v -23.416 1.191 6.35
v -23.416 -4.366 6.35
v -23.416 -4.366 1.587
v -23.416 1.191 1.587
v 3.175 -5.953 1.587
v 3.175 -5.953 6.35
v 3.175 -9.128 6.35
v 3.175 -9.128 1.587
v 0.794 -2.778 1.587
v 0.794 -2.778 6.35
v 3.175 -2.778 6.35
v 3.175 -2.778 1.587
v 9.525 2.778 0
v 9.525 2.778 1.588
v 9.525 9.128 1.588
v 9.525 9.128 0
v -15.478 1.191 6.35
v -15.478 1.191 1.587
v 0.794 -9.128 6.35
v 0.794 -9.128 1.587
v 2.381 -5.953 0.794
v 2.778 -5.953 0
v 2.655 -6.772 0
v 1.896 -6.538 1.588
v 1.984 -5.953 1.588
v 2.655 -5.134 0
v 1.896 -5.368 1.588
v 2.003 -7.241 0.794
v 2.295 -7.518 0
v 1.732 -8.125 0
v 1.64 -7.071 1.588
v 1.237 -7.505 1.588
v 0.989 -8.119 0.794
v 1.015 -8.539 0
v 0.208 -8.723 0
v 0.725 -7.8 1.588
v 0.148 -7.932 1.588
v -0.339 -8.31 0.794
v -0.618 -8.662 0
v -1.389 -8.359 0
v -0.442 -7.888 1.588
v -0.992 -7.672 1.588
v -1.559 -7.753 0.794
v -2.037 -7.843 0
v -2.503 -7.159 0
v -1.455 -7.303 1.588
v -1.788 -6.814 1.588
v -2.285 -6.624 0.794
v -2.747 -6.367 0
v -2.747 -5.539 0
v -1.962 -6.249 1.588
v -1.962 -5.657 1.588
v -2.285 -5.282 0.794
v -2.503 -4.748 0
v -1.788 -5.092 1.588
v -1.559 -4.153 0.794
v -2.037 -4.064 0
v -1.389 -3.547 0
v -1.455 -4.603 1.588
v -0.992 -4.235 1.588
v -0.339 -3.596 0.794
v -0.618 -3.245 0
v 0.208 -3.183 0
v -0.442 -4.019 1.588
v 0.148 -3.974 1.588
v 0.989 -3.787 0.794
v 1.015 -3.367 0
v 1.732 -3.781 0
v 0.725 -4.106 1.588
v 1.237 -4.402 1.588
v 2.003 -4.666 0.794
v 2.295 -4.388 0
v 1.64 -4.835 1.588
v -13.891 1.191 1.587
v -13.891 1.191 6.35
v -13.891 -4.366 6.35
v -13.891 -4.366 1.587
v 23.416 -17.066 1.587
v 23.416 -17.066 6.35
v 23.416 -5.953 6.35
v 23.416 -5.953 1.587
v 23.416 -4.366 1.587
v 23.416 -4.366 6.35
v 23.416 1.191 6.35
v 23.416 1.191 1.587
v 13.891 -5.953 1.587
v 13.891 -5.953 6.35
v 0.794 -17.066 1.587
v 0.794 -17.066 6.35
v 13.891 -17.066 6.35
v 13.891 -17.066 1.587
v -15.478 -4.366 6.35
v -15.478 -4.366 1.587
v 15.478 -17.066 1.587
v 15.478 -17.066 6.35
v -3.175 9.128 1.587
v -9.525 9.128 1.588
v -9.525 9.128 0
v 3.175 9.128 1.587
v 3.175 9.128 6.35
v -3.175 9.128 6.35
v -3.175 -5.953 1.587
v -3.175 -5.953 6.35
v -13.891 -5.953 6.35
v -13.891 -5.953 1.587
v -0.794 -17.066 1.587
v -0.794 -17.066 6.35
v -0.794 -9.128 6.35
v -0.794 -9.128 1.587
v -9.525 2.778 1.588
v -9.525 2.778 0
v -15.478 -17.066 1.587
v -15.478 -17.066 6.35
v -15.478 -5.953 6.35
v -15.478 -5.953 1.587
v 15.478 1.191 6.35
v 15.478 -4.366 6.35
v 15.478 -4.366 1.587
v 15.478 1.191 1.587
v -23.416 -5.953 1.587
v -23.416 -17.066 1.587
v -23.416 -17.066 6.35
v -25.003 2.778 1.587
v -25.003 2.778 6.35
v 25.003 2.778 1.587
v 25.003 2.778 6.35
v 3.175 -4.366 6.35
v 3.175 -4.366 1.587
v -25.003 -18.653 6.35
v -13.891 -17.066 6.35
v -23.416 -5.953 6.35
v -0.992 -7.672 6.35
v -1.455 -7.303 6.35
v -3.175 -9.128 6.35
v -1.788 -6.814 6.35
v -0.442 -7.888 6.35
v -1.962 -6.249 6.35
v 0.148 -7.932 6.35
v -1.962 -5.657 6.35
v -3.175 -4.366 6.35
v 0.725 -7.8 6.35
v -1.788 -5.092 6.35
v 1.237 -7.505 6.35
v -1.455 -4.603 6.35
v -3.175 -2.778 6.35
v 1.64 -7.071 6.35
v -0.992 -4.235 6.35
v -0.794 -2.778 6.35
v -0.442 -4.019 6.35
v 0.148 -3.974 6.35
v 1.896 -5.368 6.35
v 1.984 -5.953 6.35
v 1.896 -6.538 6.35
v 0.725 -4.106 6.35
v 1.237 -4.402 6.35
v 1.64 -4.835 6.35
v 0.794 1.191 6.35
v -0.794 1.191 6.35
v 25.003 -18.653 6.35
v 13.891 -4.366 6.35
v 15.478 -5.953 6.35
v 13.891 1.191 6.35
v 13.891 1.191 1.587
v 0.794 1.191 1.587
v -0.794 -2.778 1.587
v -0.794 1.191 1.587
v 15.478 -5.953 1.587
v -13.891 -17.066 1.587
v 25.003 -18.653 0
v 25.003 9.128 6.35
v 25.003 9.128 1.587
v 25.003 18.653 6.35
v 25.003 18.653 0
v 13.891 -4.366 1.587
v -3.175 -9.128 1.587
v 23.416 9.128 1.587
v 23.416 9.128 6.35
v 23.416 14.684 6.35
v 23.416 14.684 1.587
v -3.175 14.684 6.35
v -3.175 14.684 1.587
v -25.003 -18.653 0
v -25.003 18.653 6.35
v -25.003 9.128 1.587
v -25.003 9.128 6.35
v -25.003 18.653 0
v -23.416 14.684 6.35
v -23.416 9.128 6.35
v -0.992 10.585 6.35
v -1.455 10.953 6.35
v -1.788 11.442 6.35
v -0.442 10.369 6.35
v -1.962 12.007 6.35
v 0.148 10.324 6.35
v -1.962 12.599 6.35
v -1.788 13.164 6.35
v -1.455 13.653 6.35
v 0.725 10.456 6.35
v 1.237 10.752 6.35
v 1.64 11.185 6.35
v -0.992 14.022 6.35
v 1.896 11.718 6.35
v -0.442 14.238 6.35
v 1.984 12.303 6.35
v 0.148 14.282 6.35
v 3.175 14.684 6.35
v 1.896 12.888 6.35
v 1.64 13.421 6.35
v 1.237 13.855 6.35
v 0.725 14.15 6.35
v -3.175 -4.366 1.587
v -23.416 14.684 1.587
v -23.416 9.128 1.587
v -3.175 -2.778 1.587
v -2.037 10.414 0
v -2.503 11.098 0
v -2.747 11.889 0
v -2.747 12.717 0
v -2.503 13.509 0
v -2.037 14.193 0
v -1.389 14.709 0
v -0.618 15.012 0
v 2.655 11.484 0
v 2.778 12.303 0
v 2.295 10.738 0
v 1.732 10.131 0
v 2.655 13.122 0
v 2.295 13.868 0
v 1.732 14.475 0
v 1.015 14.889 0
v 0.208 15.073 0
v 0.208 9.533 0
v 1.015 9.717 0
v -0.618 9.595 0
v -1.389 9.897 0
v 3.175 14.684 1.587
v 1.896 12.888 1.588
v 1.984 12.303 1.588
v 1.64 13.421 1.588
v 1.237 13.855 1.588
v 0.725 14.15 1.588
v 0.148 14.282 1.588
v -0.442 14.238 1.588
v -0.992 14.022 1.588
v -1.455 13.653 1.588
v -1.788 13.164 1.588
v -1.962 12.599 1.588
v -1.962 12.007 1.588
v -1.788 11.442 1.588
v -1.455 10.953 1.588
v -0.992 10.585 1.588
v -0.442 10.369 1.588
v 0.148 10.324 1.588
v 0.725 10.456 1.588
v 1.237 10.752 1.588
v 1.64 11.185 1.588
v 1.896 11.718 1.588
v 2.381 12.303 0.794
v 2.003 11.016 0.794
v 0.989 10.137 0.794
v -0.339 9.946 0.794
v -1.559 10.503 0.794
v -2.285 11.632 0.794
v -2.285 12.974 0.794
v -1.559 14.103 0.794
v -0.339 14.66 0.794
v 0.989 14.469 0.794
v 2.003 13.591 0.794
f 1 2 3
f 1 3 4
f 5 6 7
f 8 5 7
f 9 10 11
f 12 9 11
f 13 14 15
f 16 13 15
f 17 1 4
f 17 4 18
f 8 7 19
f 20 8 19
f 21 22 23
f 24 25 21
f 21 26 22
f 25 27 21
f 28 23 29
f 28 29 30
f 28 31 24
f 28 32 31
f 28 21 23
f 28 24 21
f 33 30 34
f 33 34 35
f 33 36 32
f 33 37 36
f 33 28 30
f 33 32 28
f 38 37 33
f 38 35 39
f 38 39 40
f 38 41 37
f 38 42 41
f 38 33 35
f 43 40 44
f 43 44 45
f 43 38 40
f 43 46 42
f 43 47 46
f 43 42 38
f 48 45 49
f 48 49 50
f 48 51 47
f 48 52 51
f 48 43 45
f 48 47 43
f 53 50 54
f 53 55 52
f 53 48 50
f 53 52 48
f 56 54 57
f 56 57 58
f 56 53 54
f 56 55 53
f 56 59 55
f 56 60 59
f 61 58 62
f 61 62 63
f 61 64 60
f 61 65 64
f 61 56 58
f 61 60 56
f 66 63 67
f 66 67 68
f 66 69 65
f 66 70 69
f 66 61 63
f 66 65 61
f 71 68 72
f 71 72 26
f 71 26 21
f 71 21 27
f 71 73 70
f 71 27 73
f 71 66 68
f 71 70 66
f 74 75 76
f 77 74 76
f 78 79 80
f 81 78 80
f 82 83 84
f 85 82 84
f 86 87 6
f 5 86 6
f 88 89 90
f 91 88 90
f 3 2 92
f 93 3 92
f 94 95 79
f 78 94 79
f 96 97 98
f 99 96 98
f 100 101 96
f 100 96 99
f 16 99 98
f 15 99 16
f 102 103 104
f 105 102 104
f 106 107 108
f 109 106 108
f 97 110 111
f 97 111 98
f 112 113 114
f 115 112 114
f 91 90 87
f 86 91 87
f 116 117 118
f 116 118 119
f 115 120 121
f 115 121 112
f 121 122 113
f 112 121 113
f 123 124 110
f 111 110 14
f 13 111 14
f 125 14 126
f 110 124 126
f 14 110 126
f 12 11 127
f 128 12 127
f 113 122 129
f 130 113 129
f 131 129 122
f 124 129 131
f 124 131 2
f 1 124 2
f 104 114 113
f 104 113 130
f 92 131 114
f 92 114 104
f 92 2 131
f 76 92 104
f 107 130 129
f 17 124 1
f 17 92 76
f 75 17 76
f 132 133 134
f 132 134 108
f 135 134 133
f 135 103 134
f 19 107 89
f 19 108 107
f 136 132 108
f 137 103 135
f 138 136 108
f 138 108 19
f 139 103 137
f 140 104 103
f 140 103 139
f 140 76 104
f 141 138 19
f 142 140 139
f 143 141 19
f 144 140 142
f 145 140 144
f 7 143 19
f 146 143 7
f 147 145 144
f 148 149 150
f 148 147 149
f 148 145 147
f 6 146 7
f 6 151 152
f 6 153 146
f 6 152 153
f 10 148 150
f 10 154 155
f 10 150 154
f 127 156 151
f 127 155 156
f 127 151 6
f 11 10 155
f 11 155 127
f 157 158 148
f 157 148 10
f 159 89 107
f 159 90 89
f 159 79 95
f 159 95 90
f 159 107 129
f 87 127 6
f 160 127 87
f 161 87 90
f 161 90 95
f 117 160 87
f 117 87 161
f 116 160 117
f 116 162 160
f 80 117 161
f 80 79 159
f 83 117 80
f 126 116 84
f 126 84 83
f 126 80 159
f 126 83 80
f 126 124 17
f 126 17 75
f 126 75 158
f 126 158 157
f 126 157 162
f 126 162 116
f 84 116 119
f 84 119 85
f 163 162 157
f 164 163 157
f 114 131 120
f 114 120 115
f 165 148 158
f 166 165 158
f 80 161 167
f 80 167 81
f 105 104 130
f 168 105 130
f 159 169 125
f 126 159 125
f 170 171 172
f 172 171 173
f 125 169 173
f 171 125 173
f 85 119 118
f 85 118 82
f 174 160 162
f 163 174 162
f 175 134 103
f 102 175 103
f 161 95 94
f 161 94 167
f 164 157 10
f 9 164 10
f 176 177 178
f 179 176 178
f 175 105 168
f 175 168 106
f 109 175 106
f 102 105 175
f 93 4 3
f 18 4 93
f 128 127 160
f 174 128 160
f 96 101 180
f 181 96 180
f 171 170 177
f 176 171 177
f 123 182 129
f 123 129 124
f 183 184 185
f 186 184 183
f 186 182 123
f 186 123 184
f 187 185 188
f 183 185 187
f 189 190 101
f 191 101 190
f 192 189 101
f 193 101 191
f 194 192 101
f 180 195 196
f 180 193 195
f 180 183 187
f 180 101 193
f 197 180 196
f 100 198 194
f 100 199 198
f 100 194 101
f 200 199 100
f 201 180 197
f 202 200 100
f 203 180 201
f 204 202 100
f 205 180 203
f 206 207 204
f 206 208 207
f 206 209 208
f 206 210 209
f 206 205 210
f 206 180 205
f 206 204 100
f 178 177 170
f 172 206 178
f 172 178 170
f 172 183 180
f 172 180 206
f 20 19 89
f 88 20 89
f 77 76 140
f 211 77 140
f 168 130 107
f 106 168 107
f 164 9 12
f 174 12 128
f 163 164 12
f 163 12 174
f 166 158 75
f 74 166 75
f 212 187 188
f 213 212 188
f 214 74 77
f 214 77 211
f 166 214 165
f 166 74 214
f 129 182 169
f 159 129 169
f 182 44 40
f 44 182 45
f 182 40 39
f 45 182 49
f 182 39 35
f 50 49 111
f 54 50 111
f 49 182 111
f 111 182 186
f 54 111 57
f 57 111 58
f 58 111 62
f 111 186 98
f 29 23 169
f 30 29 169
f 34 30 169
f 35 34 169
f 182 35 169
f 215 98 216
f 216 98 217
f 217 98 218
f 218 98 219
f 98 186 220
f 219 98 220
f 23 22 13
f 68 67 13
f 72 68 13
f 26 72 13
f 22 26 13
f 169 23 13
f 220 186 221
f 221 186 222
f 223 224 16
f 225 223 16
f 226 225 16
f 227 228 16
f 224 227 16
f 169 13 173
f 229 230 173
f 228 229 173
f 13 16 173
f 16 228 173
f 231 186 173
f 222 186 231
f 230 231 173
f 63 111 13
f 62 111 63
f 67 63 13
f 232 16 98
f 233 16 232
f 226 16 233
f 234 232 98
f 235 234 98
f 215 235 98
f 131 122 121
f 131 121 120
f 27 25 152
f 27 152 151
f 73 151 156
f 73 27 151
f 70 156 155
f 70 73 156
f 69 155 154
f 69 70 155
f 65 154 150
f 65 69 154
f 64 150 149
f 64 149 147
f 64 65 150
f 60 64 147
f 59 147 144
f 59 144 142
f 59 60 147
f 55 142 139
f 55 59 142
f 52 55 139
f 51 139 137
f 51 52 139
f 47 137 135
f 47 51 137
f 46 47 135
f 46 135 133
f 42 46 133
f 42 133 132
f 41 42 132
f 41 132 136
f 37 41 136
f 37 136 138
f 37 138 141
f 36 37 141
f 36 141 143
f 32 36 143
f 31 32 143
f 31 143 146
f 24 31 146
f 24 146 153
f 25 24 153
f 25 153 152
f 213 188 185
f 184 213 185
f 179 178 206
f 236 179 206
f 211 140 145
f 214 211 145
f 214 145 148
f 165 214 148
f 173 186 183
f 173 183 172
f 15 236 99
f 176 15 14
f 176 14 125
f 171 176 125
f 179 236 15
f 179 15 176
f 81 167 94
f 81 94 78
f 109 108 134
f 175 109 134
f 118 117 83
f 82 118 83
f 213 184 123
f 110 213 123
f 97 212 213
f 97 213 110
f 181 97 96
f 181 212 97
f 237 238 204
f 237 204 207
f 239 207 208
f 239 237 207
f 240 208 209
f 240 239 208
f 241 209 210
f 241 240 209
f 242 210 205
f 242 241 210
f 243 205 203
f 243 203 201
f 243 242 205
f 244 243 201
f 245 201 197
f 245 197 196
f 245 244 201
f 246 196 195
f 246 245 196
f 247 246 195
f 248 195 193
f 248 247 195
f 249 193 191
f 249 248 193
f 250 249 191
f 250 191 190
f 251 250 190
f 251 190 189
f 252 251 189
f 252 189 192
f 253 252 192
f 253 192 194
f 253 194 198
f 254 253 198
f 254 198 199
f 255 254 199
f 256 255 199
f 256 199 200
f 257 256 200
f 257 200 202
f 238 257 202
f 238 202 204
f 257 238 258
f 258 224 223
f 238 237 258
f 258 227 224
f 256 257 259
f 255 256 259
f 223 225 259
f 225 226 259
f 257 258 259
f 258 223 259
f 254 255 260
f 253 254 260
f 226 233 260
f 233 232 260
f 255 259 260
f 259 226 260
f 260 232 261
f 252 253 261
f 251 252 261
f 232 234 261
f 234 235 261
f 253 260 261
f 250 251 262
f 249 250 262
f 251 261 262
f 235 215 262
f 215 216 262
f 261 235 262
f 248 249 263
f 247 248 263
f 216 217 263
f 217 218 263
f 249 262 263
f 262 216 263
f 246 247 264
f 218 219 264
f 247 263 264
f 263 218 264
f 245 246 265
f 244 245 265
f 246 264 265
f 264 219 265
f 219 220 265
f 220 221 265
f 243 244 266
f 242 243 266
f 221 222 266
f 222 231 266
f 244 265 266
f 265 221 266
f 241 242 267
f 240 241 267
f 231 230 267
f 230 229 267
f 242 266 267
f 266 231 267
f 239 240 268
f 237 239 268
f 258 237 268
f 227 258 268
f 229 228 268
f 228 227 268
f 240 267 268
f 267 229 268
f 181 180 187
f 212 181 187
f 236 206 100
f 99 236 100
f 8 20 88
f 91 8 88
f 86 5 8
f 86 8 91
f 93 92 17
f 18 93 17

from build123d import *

# Parameters (mm, degrees)
F0_W      = 50.00625
F0_H      = 37.30625
F0_R      = 1.984375
F0_W_2    = 19.05
F0_H_2    = 5.55625
F1_DEPTH  = 6.35
F2_W      = 7.9375
F2_H      = 5.55625
F2_H_2    = 11.1125
F3_DEPTH  = 4.7625
F5_R      = 1.984375
F6_R      = 2.778125
F8_R      = 2.778125
F9_R      = 1.984375
F11_W     = 19.05
F11_H     = 6.35
F12_DEPTH = 25.4


with BuildPart() as f1:
    # F0 (on Top) → F1 (new body)
    with BuildSketch(Plane.XY):
        Rectangle(F0_W, F0_H)
        with Locations((0, -5.953125)):
            Circle(F0_R, mode=Mode.SUBTRACT)
        with Locations((0, 5.953125)):
            Rectangle(F0_W_2, F0_H_2, mode=Mode.SUBTRACT)
        with Locations((0, 12.303125)):
            Circle(F0_R, mode=Mode.SUBTRACT)
    extrude(amount=F1_DEPTH)

    # F2 (on face) → F3 (cut)
    with BuildSketch(Plane.XY.offset(6.35)):
        Polygon((-3.175, 14.684375), (-23.415625, 14.684375), (-23.415625, 9.128125), (-25.003125, 9.128125), (-25.003125, 2.778125), (-23.415625, 2.778125), (0, 2.778125), (23.415625, 2.778125), (25.003125, 2.778125), (25.003125, 9.128125), (23.415625, 9.128125), (23.415625, 14.684375), (3.175, 14.684375), (3.175, 9.128125), (-3.175, 9.128125), align=None)
        with Locations((-19.446875, -1.5875)):
            Rectangle(F2_W, F2_H)
        Polygon((-0.79375, 1.190625), (-13.890625, 1.190625), (-13.890625, -4.365625), (-3.175, -4.365625), (-3.175, -2.778125), (-0.79375, -2.778125), align=None)
        with Locations((-19.446875, -11.509375)):
            Rectangle(F2_W, F2_H_2)
        Polygon((-3.175, -5.953125), (-13.890625, -5.953125), (-13.890625, -17.065625), (-0.79375, -17.065625), (-0.79375, -9.128125), (-3.175, -9.128125), align=None)
        Polygon((0.79375, -2.778125), (3.175, -2.778125), (3.175, -4.365625), (13.890625, -4.365625), (13.890625, 1.190625), (0.79375, 1.190625), align=None)
        Polygon((13.890625, -5.953125), (3.175, -5.953125), (3.175, -9.128125), (0.79375, -9.128125), (0.79375, -17.065625), (13.890625, -17.065625), align=None)
        with Locations((19.446875, -1.5875)):
            Rectangle(F2_W, F2_H)
        with Locations((19.446875, -11.509375)):
            Rectangle(F2_W, F2_H_2)
    extrude(amount=-F3_DEPTH, mode=Mode.SUBTRACT)

    # F5 (on offset) → F7 section 0
    with BuildSketch(Plane(origin=(0, 0, 1.5875), x_dir=(1, 0, 0), z_dir=(0, 0, -1))):
        with Locations((0, -12.303125)):
            Circle(F5_R)
    # F6 (on face) → F7 section 1
    with BuildSketch(Plane(origin=(0, 0, 0), x_dir=(1, 0, 0), z_dir=(0, 0, -1))):
        with Locations((0, -12.303125)):
            Circle(F6_R)
    loft(mode=Mode.SUBTRACT)

    # F8 (on face) → F10 section 0
    with BuildSketch(Plane(origin=(0, 0, 0), x_dir=(1, 0, 0), z_dir=(0, 0, -1))):
        with Locations((0, 5.953125)):
            Circle(F8_R)
    # F9 (on offset) → F10 section 1
    with BuildSketch(Plane(origin=(0, 0, 1.5875), x_dir=(1, 0, 0), z_dir=(0, 0, -1))):
        with Locations((0, 5.953125)):
            Circle(F9_R)
    loft(mode=Mode.SUBTRACT)

    # F11 (on face) → F12 (cut)
    with BuildSketch(Plane.XY.offset(1.5875)):
        with Locations((0, 5.953125)):
            Rectangle(F11_W, F11_H)
    extrude(amount=-F12_DEPTH, mode=Mode.SUBTRACT)


solid = f1.part
